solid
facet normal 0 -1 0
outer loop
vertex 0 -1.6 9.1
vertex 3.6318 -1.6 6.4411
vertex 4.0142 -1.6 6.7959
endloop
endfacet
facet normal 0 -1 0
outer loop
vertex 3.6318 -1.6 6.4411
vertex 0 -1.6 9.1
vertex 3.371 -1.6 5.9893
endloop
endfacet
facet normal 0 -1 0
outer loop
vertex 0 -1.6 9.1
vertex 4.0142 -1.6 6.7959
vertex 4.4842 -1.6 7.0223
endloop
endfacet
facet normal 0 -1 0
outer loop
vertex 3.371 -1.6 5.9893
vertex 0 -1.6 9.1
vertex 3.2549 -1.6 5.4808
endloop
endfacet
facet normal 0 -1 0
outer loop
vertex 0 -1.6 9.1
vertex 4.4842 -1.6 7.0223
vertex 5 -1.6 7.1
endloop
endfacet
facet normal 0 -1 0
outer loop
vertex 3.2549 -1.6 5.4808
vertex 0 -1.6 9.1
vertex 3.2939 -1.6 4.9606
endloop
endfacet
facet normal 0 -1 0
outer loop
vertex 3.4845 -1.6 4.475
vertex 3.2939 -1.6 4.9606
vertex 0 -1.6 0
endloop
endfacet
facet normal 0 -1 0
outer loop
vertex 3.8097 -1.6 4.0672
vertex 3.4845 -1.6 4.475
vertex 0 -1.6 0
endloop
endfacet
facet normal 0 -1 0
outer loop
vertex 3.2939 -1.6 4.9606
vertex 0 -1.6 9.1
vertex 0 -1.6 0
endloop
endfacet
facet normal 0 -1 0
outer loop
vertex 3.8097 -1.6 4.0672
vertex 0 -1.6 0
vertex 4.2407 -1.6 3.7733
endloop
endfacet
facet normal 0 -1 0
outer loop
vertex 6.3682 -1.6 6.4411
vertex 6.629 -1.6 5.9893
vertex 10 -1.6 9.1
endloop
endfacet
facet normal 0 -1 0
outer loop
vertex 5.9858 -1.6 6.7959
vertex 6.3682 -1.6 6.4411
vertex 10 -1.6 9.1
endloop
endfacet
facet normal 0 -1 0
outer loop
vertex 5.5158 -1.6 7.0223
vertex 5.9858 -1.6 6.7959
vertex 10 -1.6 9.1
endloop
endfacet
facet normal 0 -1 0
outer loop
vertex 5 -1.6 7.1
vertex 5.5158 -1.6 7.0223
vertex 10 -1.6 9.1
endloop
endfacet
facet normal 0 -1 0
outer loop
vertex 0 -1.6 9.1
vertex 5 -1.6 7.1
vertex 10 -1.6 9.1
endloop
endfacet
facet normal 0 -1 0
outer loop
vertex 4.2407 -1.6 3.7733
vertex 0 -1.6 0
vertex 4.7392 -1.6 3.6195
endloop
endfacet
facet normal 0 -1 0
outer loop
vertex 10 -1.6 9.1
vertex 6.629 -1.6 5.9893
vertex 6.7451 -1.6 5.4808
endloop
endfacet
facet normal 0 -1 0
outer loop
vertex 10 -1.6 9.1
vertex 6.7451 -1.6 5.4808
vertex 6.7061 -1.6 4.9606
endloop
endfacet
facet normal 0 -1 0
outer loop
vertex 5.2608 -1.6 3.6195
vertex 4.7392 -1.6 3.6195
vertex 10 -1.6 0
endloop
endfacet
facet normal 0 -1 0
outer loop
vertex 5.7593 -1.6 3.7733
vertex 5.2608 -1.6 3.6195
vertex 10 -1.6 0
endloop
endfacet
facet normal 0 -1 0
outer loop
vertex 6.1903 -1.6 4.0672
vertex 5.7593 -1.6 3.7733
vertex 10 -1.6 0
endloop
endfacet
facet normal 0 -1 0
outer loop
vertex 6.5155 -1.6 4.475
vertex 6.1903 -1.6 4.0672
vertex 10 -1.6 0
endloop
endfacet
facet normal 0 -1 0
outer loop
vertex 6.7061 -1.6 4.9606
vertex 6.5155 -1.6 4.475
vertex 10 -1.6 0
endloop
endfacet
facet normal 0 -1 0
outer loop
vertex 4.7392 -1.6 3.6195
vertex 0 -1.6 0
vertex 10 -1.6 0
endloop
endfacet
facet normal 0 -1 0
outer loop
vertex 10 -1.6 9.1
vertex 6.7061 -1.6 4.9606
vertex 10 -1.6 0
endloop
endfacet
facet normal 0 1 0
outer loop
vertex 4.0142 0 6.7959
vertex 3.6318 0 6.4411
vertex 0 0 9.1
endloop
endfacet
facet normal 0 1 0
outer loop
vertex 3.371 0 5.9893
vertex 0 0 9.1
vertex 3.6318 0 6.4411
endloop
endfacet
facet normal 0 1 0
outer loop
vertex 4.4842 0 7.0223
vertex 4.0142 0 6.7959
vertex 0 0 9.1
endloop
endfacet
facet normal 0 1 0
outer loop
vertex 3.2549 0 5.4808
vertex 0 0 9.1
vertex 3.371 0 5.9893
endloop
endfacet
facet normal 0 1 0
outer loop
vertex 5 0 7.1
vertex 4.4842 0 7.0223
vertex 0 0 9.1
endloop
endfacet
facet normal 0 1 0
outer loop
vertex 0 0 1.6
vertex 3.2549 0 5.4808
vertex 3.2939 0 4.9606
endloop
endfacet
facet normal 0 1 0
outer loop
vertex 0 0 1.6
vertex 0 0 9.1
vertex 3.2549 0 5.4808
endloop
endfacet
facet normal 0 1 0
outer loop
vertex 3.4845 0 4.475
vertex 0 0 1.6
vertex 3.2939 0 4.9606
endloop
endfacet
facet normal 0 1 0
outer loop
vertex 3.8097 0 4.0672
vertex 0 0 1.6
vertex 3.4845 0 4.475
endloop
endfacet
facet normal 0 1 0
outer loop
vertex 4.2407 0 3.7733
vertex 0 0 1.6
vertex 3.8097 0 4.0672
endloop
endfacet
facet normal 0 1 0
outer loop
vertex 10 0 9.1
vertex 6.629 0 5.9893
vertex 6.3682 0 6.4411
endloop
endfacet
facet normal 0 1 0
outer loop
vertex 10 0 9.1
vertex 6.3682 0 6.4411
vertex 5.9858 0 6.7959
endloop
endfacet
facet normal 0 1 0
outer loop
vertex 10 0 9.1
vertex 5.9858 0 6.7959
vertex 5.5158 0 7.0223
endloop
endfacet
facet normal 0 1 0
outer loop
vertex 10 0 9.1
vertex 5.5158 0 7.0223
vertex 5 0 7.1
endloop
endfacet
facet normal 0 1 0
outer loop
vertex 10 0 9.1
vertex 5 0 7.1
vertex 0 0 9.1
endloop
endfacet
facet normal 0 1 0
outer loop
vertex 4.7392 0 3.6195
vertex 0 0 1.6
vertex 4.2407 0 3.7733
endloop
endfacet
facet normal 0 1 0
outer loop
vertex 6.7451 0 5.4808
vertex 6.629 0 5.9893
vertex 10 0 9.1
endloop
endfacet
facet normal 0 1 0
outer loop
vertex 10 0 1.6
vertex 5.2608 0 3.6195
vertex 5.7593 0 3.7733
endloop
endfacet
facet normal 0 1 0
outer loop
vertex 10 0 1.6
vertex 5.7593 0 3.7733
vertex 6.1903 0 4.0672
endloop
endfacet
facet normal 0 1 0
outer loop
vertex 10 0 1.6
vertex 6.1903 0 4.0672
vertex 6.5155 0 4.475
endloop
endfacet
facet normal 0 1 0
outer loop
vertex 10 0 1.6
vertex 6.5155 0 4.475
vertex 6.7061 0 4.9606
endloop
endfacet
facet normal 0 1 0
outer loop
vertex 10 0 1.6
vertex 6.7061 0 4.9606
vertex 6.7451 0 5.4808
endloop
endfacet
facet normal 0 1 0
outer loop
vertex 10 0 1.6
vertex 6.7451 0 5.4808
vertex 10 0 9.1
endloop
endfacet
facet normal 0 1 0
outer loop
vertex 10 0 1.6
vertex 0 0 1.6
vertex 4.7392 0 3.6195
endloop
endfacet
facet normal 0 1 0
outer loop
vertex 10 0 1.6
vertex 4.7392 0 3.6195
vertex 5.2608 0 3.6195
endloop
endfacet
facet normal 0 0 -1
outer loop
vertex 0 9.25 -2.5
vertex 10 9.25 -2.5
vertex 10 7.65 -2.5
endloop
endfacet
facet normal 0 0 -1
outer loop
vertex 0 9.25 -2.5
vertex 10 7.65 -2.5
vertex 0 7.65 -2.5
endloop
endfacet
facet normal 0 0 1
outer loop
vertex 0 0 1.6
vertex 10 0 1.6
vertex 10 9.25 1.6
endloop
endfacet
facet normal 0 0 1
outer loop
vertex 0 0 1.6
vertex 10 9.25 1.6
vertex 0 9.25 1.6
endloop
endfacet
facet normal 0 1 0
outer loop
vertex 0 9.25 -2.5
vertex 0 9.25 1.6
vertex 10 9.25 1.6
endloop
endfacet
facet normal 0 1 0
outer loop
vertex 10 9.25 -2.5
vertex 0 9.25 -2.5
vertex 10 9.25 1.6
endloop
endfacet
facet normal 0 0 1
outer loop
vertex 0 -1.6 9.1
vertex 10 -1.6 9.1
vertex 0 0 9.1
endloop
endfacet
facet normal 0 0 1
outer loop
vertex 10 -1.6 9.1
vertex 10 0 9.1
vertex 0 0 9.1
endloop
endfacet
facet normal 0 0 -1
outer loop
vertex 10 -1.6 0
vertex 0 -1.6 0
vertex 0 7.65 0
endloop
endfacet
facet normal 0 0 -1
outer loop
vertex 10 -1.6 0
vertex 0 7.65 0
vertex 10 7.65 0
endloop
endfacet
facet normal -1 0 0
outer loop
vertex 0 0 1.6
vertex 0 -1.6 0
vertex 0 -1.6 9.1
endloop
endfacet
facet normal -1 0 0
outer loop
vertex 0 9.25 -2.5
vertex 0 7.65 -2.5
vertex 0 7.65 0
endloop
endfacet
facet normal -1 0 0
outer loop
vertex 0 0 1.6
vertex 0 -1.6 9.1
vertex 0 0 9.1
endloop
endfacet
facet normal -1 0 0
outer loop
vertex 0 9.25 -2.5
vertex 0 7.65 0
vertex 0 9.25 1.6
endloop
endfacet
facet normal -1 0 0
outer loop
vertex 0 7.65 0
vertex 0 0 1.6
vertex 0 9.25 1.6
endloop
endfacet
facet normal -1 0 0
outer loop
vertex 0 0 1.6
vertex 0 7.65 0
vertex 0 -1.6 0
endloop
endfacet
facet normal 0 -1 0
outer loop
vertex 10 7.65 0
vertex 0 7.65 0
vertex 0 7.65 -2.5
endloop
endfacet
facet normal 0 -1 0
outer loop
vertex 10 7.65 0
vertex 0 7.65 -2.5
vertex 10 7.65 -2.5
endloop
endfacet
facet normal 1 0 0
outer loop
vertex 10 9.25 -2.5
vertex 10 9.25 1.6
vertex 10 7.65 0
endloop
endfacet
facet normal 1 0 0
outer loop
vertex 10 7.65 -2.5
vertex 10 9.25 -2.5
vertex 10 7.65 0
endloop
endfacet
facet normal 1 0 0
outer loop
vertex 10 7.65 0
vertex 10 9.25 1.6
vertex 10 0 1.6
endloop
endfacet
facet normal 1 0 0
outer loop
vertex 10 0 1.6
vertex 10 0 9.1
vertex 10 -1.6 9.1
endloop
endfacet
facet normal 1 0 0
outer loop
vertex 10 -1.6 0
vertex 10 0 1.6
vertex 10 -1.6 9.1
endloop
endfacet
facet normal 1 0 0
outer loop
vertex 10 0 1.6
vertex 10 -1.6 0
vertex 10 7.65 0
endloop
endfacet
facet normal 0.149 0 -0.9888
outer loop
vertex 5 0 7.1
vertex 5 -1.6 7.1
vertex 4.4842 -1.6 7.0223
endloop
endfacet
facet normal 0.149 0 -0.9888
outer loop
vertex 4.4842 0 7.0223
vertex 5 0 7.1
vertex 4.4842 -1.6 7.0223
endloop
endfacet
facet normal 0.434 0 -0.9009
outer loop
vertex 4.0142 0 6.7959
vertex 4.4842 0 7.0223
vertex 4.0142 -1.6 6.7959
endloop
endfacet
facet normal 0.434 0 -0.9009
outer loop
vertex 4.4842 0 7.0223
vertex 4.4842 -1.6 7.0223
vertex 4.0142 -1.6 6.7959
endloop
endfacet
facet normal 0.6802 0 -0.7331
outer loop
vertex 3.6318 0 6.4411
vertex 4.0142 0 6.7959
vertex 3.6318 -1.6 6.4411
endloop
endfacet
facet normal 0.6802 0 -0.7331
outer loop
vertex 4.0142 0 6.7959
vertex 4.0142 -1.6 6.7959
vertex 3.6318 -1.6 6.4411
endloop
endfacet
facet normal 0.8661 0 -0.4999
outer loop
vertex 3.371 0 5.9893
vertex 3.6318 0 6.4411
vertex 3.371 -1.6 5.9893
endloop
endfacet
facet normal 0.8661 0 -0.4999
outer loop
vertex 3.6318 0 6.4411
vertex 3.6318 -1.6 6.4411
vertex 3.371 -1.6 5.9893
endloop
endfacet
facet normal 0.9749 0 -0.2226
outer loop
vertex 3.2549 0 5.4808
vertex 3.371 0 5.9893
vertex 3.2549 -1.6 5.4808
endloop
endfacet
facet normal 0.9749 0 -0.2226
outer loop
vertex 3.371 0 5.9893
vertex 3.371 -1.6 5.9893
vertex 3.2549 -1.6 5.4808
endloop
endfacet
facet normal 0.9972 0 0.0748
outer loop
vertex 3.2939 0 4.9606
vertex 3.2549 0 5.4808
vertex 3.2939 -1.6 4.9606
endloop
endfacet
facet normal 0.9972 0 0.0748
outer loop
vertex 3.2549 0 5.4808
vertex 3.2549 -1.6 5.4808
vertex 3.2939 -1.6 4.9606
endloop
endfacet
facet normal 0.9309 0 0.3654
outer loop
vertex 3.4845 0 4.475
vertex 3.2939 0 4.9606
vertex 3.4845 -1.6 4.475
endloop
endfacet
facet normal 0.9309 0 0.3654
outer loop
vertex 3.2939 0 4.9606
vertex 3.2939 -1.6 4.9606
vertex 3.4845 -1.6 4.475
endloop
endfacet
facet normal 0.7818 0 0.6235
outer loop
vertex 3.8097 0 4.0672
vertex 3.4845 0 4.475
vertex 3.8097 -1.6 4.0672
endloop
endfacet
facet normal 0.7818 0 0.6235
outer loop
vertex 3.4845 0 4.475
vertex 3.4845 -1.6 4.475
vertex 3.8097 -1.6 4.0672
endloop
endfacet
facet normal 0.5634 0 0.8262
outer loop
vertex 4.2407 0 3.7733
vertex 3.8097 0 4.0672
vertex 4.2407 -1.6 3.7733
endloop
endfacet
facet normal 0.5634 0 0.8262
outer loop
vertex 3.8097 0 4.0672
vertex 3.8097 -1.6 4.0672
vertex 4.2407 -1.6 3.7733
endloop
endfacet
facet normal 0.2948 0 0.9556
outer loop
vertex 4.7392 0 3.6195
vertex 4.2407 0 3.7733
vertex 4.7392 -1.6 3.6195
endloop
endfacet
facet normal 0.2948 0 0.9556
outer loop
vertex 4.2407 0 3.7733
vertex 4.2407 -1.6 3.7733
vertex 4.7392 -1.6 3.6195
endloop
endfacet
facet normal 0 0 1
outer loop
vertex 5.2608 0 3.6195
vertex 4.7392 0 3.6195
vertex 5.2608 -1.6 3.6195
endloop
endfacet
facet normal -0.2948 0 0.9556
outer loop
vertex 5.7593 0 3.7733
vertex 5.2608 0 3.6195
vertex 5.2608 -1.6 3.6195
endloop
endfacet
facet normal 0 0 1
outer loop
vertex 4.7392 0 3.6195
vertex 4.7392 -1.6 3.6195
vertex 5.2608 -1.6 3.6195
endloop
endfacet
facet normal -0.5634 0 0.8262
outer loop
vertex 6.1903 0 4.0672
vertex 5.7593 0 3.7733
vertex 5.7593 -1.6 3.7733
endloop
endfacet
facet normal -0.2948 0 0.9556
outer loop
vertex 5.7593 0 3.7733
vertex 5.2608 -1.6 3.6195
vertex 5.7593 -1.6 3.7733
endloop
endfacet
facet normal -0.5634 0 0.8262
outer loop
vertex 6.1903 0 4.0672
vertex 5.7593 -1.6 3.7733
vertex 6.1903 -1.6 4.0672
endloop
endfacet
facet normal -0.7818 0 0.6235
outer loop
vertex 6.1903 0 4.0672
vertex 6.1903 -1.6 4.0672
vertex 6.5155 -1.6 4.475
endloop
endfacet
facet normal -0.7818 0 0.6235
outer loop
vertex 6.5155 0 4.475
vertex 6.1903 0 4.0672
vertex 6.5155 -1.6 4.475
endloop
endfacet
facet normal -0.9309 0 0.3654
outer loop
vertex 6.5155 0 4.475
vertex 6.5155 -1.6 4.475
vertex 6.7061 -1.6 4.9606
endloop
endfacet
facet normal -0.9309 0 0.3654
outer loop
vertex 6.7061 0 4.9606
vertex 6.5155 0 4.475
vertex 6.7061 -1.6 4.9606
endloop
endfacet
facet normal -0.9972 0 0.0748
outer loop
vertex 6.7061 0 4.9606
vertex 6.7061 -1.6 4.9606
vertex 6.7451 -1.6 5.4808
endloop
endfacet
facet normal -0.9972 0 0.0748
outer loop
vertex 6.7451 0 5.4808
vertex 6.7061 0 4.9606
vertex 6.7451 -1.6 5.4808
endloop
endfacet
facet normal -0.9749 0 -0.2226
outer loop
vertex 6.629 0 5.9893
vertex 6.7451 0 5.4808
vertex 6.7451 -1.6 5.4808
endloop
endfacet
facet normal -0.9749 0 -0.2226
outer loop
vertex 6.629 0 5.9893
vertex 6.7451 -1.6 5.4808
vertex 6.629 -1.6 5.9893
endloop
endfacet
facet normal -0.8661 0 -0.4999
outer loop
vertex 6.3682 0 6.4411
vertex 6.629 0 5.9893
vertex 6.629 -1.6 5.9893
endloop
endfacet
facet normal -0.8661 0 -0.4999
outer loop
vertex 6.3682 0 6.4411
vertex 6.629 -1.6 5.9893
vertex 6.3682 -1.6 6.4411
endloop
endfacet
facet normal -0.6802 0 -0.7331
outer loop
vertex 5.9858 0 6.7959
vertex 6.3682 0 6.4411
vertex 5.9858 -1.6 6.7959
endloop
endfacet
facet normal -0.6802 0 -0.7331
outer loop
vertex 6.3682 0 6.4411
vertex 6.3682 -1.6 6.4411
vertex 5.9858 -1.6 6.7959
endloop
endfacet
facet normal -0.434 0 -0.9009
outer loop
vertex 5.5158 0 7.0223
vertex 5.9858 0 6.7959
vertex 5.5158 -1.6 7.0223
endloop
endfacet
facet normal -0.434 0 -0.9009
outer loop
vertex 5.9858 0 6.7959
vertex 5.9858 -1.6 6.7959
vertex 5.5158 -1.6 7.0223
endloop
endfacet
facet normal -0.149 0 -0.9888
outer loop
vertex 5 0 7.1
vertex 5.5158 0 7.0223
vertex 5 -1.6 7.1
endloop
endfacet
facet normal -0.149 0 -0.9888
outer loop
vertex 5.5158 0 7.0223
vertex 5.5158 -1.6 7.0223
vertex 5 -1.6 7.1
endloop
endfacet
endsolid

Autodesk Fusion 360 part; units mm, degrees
sketch "Sketch1" plane through (0, 0, 0) normal (0, 1, 0) x (1, 0, 0)
  line L0 (0, 0) -> (10, 0)
  line L1 (10, 0) -> (10, -9.1)
  line L2 (10, -9.1) -> (0, -9.1)
  line L3 (0, -9.1) -> (0, 0)
  line L4 (0, 0) -> (10, 0)
  line L5 (10, 0) -> (10, -1.6)
  line L6 (10, -1.6) -> (0, -1.6)
  line L7 (0, -1.6) -> (0, 0)
  point P0 (5, -5.35)
  dimension "d1" = 1.6
  dimension "d2" = 7.5
  dimension "d3" = 10
  dimension "d10" = 5
  dimension "d11" = 3.75
extrude "Extrude1" add sketch "Sketch1" against normal blind 1.6
extrude "Extrude2" add sketch "Sketch1" along normal blind 9.25 contours L0 L1 L3 L4 L5 L6 L7
sketch "Sketch2" plane through (0, 0, 0) normal (0, 0, -1) x (-1, 0, 0)
  line L0 (-10, 9.25) -> (-10, -1.6)
  line L1 (-10, -1.6) -> (0, -1.6)
  line L2 (0, -1.6) -> (0, 9.25)
  line L3 (0, 9.25) -> (-10, 9.25)
  line L4 (-10, 9.25) -> (0, 9.25)
  line L5 (0, 9.25) -> (0, 7.65)
  line L6 (0, 7.65) -> (-10, 7.65)
  line L7 (-10, 7.65) -> (-10, 9.25)
  dimension "d15" = 1.6
extrude "Extrude3" add sketch "Sketch2" along normal blind 2.5 contours L0 L2 L3 L4 L5 L6 L7
hole "Hole1" at (5, 0, 5.35) direction (0, -1, 0) diameter 3.5 depth 3 tip angle 118
equation "d10 = d3 / 2"
equation "d11 = d2 / 2"
